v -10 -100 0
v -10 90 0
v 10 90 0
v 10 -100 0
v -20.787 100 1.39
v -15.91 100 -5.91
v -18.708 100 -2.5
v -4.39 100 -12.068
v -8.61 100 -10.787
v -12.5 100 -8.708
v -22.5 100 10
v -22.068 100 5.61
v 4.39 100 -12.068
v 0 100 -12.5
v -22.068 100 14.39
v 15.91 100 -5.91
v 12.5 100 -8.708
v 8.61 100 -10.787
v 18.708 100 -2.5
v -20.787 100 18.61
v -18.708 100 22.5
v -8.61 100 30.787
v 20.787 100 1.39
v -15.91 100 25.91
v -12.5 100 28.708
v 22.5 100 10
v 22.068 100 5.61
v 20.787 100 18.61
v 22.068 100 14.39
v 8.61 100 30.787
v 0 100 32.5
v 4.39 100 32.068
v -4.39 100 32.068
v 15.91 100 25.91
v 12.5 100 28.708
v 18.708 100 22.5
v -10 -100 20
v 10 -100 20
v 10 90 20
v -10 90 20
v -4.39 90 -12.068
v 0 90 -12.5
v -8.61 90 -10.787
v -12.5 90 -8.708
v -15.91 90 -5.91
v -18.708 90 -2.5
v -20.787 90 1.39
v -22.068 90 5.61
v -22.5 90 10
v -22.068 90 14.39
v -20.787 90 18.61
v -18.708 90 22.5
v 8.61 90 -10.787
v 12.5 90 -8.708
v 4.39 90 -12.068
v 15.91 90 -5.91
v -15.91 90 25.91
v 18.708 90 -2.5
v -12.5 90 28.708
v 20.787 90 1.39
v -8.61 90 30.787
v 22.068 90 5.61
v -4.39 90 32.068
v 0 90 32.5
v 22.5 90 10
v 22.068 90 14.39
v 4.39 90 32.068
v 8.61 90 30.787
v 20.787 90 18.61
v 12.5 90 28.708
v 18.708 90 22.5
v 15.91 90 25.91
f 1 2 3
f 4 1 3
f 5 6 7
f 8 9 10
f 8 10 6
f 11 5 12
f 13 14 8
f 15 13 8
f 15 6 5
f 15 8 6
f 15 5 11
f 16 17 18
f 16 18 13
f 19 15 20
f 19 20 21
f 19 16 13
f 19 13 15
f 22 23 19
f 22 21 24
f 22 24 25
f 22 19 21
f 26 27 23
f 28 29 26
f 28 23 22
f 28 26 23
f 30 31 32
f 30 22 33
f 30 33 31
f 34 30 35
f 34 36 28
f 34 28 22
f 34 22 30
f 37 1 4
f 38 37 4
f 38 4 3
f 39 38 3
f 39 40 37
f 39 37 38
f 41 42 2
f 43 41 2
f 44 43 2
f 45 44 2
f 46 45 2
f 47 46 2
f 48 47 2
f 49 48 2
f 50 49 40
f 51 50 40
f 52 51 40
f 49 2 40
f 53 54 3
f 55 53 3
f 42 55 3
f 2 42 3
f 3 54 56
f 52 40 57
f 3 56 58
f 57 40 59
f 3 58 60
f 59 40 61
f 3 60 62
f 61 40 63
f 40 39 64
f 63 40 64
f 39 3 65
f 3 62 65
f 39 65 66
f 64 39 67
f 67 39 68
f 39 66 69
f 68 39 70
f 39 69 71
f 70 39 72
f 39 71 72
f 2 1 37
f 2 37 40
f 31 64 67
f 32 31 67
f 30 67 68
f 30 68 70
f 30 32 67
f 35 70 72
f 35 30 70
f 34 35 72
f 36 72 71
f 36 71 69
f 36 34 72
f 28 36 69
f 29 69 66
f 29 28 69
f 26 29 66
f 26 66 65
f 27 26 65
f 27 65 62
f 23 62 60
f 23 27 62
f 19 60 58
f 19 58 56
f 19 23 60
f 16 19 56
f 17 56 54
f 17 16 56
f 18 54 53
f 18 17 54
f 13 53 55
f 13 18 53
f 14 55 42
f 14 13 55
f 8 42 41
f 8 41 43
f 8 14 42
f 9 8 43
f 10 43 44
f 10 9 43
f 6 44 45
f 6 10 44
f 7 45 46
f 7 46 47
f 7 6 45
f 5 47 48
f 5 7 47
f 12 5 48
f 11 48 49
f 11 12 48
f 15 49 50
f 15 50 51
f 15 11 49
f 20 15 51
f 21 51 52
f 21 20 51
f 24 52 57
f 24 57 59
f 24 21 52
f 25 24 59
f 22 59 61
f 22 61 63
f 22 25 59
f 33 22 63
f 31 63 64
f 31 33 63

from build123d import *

# Parameters (mm, degrees)
SKETCH1_W           = 20
SKETCH1_H           = 200
BOSS_EXTRUDE1_DEPTH = 20
SKETCH4_R           = 22.5
BOSS_EXTRUDE3_DEPTH = 10


with BuildPart() as part:
    # Sketch1 → Boss-Extrude1 (new body)
    with BuildSketch(Plane.XY):
        Rectangle(SKETCH1_W, SKETCH1_H)
    extrude(amount=BOSS_EXTRUDE1_DEPTH)

    # Sketch4 → Boss-Extrude3 (add)
    with BuildSketch(Plane(origin=(0, 100, 0), x_dir=(1, 0, 0), z_dir=(0, 1, 0))):
        with Locations(Location((0, -10, 0), (0, 0, 270))):
            Circle(SKETCH4_R)
    extrude(amount=-BOSS_EXTRUDE3_DEPTH)


solid = part.part
